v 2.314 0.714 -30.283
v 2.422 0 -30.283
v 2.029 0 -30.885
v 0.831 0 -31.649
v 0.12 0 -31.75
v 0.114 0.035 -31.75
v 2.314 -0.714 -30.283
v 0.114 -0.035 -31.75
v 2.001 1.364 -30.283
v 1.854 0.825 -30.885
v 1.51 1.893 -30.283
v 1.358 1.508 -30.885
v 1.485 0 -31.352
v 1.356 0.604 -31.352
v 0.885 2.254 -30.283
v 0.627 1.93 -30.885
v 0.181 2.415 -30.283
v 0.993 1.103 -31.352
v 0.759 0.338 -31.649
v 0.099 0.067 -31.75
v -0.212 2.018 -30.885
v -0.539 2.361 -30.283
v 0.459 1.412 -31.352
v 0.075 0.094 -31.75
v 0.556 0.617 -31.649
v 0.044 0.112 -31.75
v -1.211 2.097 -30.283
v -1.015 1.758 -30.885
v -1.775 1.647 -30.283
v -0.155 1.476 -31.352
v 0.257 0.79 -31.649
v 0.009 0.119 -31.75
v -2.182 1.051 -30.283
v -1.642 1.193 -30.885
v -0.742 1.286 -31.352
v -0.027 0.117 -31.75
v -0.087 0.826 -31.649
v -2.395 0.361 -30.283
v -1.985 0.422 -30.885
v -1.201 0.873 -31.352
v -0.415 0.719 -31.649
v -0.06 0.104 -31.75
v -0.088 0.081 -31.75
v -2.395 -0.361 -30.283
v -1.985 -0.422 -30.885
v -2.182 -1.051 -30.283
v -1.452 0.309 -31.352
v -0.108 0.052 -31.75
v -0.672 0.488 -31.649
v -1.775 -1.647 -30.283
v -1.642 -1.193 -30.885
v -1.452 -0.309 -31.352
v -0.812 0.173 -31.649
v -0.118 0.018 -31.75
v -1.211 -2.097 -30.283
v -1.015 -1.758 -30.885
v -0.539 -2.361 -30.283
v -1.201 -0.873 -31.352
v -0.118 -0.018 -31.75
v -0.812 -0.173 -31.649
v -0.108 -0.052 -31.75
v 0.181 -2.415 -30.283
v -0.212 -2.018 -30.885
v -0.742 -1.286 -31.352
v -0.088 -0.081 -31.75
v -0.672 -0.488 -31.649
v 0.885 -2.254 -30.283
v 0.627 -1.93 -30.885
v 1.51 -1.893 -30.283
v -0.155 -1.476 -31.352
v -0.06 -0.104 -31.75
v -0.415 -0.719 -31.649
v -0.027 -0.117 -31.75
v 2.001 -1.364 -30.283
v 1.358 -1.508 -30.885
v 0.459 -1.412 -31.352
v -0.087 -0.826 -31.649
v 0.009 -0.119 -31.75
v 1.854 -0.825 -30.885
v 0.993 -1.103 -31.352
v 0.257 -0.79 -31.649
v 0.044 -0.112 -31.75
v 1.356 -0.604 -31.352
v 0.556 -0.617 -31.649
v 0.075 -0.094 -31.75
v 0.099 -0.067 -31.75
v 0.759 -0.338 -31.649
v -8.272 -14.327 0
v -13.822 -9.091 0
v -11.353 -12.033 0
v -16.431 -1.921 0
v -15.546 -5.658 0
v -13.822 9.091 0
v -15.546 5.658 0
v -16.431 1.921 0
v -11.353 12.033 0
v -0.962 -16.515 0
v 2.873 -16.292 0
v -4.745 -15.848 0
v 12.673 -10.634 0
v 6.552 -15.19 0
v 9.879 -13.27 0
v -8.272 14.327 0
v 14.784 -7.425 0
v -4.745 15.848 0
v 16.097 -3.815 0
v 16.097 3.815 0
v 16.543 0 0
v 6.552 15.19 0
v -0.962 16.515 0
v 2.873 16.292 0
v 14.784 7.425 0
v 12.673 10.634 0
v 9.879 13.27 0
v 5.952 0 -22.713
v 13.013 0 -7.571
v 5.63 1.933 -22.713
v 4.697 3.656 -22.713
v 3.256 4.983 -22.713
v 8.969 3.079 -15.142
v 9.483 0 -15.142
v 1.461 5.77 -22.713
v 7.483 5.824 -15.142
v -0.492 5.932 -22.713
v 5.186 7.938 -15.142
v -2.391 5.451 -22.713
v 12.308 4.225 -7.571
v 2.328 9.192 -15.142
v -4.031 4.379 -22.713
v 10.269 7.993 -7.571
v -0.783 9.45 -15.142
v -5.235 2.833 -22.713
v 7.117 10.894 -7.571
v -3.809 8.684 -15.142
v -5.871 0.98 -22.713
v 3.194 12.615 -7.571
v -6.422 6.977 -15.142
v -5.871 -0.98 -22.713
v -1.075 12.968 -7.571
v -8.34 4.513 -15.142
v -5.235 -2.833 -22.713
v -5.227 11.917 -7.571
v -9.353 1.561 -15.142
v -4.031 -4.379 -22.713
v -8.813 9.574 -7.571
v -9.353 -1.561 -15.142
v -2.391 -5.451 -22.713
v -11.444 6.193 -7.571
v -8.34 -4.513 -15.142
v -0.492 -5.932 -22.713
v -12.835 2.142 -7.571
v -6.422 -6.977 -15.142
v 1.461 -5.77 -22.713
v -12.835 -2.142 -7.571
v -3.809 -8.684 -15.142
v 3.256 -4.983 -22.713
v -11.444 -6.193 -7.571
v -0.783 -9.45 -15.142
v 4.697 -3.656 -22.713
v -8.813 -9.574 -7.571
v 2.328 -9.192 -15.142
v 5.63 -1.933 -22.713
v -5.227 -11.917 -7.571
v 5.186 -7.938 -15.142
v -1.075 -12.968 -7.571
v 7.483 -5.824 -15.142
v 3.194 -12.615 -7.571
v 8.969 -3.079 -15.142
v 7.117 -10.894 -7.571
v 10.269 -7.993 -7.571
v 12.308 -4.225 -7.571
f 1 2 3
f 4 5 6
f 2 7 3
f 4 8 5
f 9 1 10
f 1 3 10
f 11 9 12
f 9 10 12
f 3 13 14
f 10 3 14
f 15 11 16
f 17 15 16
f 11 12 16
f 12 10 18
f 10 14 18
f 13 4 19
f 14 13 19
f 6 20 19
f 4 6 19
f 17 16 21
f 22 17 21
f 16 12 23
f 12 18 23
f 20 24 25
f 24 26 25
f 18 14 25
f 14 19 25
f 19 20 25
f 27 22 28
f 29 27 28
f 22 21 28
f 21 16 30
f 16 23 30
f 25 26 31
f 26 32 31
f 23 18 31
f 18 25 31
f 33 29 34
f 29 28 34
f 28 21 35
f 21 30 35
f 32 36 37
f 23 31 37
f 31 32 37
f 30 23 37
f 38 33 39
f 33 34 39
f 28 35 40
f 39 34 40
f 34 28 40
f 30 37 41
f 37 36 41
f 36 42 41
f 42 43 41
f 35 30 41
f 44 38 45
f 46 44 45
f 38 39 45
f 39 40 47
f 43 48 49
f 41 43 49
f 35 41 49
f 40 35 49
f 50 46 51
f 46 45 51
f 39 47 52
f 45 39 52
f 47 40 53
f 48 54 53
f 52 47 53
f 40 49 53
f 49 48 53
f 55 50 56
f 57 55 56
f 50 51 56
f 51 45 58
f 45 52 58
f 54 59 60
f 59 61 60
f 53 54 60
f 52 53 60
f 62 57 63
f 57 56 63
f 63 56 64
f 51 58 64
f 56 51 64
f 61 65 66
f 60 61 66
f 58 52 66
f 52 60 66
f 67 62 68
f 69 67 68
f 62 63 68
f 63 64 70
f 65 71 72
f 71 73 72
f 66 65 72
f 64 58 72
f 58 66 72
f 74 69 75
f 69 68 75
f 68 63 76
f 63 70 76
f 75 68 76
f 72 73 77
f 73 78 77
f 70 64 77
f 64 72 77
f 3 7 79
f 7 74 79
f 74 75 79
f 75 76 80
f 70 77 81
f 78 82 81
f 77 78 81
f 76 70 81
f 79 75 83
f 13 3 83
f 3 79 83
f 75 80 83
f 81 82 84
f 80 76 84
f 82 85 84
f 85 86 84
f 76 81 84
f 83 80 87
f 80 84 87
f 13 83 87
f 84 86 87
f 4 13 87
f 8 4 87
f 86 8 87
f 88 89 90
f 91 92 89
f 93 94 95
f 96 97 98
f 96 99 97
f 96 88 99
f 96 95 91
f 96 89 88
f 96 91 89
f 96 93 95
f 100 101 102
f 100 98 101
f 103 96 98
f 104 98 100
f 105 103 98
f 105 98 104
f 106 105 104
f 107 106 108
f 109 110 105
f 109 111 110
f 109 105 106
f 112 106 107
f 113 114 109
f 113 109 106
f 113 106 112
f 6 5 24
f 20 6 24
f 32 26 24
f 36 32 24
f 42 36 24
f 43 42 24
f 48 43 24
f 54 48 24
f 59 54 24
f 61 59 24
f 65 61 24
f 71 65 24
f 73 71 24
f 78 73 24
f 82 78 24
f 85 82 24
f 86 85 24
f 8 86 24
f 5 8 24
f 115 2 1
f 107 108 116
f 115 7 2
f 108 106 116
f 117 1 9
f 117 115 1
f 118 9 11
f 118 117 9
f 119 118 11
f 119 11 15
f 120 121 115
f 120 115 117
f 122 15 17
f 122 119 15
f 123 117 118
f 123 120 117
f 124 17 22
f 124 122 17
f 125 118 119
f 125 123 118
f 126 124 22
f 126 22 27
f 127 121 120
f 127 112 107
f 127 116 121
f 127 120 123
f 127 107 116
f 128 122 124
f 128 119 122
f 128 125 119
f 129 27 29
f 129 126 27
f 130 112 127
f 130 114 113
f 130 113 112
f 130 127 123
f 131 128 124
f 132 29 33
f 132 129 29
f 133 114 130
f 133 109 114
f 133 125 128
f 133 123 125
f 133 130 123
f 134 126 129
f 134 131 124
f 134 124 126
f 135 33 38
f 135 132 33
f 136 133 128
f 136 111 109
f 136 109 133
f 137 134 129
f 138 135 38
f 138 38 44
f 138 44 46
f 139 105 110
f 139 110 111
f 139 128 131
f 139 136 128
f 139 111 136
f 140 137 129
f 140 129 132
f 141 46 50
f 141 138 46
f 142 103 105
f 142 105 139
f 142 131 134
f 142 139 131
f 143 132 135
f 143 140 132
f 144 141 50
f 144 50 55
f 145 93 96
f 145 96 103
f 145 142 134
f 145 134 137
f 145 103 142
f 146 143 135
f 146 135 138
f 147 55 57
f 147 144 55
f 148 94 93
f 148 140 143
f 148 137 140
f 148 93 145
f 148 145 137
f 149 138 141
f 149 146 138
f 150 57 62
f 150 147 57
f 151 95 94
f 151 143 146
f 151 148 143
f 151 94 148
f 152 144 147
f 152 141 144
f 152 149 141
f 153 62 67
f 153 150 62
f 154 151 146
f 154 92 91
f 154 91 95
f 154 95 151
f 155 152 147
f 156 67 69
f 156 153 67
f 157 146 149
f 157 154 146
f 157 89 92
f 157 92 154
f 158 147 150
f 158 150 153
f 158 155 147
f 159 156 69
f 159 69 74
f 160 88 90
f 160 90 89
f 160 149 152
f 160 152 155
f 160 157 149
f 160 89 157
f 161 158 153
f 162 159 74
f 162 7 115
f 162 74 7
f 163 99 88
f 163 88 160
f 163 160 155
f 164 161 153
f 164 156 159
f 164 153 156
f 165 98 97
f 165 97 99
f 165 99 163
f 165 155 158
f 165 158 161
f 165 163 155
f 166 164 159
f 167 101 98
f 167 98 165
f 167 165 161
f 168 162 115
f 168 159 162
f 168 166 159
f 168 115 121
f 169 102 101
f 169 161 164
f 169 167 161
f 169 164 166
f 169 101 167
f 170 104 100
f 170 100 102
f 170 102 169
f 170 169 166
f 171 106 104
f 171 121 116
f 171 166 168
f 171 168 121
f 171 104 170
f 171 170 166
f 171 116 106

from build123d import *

# Parameters (mm, degrees)
F1_R     = 4.699
F2_DEPTH = 6.35
F2_TAPER = 25
F3_R     = 2.54
F4_R     = 4.699
F5_DEPTH = 25.4
F5_TAPER = -25


with BuildPart() as f2:
    # F1 (on offset) → F2 (new body)
    with BuildSketch(Plane.XY.offset(-25.4)):
        Circle(F1_R)
    extrude(amount=-F2_DEPTH, taper=F2_TAPER)

    # F3
    f3_edges = [f2.edges().sort_by_distance(p)[0] for p in [
        (-1.737946, 0, -31.75),
    ]]
    fillet(f3_edges, radius=F3_R)

    # F4 (on offset) → F5 (join)
    with BuildSketch(Plane.XY.offset(-25.4)):
        Circle(F4_R)
    extrude(amount=F5_DEPTH, taper=F5_TAPER)


solid = f2.part
